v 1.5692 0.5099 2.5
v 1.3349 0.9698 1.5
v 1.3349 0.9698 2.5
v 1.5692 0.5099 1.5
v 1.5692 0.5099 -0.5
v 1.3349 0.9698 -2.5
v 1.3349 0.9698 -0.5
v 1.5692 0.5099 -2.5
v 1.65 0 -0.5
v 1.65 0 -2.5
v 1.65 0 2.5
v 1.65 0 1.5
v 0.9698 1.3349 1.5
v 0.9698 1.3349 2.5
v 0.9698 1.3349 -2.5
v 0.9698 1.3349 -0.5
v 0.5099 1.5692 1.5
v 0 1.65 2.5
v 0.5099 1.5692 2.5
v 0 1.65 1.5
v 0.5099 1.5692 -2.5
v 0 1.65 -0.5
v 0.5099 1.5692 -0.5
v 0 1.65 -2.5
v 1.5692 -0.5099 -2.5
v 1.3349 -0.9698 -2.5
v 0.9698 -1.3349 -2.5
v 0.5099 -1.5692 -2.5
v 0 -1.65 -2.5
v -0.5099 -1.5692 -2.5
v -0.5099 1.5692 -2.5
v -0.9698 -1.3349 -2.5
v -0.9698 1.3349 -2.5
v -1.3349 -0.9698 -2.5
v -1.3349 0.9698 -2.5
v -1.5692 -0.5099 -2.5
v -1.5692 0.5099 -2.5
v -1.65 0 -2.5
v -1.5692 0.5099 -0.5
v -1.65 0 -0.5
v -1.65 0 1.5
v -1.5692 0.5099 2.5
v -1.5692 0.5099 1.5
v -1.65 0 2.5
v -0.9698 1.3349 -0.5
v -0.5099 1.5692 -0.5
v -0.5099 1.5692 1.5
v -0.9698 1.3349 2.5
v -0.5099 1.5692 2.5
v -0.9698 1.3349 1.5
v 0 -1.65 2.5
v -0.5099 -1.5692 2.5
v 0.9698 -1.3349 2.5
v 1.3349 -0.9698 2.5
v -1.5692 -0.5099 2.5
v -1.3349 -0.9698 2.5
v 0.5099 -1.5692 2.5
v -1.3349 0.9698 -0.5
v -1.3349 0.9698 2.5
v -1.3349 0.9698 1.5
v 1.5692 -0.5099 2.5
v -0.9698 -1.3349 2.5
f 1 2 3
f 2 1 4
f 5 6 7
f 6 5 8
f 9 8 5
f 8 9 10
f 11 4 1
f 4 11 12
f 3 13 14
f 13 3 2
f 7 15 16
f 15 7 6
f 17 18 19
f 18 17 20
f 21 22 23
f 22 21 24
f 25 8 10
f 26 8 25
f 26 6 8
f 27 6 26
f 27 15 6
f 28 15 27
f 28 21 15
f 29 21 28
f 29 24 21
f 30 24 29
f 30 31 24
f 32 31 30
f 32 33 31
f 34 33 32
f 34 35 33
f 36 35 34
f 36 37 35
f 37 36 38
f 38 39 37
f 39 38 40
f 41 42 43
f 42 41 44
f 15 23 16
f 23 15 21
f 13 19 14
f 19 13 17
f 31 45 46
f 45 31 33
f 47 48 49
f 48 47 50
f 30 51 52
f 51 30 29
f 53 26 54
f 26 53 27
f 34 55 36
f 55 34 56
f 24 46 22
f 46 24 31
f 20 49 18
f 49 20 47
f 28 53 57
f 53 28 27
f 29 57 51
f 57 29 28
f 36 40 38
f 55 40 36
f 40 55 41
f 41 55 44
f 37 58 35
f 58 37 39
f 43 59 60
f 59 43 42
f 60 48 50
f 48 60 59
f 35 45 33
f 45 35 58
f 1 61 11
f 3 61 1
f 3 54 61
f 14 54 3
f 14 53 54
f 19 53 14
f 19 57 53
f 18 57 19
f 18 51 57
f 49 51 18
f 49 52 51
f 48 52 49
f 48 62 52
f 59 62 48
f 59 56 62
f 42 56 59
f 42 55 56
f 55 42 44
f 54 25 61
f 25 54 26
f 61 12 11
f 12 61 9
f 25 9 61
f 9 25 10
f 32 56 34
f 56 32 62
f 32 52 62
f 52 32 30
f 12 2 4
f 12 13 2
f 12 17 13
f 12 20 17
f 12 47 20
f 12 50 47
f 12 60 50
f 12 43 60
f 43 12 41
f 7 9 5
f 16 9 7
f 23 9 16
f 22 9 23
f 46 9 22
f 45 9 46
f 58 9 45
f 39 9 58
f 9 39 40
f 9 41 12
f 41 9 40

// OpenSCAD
// Hook pegs, cylinder with a notch
module hanger_peg(h=10,d=3.3,notch=2,lip=1) {
  assert(h >= notch + lip, "Height must be larger than notch and lip");
  difference() {
    cylinder(d=d, h=h, center=true);
    translate([0, d/2, h/2 - notch/2 - lip]) {
      cube(size=[d+1, d, notch], center=true);
    }
  }
}
hanger_peg(h=5,$fn=20);
